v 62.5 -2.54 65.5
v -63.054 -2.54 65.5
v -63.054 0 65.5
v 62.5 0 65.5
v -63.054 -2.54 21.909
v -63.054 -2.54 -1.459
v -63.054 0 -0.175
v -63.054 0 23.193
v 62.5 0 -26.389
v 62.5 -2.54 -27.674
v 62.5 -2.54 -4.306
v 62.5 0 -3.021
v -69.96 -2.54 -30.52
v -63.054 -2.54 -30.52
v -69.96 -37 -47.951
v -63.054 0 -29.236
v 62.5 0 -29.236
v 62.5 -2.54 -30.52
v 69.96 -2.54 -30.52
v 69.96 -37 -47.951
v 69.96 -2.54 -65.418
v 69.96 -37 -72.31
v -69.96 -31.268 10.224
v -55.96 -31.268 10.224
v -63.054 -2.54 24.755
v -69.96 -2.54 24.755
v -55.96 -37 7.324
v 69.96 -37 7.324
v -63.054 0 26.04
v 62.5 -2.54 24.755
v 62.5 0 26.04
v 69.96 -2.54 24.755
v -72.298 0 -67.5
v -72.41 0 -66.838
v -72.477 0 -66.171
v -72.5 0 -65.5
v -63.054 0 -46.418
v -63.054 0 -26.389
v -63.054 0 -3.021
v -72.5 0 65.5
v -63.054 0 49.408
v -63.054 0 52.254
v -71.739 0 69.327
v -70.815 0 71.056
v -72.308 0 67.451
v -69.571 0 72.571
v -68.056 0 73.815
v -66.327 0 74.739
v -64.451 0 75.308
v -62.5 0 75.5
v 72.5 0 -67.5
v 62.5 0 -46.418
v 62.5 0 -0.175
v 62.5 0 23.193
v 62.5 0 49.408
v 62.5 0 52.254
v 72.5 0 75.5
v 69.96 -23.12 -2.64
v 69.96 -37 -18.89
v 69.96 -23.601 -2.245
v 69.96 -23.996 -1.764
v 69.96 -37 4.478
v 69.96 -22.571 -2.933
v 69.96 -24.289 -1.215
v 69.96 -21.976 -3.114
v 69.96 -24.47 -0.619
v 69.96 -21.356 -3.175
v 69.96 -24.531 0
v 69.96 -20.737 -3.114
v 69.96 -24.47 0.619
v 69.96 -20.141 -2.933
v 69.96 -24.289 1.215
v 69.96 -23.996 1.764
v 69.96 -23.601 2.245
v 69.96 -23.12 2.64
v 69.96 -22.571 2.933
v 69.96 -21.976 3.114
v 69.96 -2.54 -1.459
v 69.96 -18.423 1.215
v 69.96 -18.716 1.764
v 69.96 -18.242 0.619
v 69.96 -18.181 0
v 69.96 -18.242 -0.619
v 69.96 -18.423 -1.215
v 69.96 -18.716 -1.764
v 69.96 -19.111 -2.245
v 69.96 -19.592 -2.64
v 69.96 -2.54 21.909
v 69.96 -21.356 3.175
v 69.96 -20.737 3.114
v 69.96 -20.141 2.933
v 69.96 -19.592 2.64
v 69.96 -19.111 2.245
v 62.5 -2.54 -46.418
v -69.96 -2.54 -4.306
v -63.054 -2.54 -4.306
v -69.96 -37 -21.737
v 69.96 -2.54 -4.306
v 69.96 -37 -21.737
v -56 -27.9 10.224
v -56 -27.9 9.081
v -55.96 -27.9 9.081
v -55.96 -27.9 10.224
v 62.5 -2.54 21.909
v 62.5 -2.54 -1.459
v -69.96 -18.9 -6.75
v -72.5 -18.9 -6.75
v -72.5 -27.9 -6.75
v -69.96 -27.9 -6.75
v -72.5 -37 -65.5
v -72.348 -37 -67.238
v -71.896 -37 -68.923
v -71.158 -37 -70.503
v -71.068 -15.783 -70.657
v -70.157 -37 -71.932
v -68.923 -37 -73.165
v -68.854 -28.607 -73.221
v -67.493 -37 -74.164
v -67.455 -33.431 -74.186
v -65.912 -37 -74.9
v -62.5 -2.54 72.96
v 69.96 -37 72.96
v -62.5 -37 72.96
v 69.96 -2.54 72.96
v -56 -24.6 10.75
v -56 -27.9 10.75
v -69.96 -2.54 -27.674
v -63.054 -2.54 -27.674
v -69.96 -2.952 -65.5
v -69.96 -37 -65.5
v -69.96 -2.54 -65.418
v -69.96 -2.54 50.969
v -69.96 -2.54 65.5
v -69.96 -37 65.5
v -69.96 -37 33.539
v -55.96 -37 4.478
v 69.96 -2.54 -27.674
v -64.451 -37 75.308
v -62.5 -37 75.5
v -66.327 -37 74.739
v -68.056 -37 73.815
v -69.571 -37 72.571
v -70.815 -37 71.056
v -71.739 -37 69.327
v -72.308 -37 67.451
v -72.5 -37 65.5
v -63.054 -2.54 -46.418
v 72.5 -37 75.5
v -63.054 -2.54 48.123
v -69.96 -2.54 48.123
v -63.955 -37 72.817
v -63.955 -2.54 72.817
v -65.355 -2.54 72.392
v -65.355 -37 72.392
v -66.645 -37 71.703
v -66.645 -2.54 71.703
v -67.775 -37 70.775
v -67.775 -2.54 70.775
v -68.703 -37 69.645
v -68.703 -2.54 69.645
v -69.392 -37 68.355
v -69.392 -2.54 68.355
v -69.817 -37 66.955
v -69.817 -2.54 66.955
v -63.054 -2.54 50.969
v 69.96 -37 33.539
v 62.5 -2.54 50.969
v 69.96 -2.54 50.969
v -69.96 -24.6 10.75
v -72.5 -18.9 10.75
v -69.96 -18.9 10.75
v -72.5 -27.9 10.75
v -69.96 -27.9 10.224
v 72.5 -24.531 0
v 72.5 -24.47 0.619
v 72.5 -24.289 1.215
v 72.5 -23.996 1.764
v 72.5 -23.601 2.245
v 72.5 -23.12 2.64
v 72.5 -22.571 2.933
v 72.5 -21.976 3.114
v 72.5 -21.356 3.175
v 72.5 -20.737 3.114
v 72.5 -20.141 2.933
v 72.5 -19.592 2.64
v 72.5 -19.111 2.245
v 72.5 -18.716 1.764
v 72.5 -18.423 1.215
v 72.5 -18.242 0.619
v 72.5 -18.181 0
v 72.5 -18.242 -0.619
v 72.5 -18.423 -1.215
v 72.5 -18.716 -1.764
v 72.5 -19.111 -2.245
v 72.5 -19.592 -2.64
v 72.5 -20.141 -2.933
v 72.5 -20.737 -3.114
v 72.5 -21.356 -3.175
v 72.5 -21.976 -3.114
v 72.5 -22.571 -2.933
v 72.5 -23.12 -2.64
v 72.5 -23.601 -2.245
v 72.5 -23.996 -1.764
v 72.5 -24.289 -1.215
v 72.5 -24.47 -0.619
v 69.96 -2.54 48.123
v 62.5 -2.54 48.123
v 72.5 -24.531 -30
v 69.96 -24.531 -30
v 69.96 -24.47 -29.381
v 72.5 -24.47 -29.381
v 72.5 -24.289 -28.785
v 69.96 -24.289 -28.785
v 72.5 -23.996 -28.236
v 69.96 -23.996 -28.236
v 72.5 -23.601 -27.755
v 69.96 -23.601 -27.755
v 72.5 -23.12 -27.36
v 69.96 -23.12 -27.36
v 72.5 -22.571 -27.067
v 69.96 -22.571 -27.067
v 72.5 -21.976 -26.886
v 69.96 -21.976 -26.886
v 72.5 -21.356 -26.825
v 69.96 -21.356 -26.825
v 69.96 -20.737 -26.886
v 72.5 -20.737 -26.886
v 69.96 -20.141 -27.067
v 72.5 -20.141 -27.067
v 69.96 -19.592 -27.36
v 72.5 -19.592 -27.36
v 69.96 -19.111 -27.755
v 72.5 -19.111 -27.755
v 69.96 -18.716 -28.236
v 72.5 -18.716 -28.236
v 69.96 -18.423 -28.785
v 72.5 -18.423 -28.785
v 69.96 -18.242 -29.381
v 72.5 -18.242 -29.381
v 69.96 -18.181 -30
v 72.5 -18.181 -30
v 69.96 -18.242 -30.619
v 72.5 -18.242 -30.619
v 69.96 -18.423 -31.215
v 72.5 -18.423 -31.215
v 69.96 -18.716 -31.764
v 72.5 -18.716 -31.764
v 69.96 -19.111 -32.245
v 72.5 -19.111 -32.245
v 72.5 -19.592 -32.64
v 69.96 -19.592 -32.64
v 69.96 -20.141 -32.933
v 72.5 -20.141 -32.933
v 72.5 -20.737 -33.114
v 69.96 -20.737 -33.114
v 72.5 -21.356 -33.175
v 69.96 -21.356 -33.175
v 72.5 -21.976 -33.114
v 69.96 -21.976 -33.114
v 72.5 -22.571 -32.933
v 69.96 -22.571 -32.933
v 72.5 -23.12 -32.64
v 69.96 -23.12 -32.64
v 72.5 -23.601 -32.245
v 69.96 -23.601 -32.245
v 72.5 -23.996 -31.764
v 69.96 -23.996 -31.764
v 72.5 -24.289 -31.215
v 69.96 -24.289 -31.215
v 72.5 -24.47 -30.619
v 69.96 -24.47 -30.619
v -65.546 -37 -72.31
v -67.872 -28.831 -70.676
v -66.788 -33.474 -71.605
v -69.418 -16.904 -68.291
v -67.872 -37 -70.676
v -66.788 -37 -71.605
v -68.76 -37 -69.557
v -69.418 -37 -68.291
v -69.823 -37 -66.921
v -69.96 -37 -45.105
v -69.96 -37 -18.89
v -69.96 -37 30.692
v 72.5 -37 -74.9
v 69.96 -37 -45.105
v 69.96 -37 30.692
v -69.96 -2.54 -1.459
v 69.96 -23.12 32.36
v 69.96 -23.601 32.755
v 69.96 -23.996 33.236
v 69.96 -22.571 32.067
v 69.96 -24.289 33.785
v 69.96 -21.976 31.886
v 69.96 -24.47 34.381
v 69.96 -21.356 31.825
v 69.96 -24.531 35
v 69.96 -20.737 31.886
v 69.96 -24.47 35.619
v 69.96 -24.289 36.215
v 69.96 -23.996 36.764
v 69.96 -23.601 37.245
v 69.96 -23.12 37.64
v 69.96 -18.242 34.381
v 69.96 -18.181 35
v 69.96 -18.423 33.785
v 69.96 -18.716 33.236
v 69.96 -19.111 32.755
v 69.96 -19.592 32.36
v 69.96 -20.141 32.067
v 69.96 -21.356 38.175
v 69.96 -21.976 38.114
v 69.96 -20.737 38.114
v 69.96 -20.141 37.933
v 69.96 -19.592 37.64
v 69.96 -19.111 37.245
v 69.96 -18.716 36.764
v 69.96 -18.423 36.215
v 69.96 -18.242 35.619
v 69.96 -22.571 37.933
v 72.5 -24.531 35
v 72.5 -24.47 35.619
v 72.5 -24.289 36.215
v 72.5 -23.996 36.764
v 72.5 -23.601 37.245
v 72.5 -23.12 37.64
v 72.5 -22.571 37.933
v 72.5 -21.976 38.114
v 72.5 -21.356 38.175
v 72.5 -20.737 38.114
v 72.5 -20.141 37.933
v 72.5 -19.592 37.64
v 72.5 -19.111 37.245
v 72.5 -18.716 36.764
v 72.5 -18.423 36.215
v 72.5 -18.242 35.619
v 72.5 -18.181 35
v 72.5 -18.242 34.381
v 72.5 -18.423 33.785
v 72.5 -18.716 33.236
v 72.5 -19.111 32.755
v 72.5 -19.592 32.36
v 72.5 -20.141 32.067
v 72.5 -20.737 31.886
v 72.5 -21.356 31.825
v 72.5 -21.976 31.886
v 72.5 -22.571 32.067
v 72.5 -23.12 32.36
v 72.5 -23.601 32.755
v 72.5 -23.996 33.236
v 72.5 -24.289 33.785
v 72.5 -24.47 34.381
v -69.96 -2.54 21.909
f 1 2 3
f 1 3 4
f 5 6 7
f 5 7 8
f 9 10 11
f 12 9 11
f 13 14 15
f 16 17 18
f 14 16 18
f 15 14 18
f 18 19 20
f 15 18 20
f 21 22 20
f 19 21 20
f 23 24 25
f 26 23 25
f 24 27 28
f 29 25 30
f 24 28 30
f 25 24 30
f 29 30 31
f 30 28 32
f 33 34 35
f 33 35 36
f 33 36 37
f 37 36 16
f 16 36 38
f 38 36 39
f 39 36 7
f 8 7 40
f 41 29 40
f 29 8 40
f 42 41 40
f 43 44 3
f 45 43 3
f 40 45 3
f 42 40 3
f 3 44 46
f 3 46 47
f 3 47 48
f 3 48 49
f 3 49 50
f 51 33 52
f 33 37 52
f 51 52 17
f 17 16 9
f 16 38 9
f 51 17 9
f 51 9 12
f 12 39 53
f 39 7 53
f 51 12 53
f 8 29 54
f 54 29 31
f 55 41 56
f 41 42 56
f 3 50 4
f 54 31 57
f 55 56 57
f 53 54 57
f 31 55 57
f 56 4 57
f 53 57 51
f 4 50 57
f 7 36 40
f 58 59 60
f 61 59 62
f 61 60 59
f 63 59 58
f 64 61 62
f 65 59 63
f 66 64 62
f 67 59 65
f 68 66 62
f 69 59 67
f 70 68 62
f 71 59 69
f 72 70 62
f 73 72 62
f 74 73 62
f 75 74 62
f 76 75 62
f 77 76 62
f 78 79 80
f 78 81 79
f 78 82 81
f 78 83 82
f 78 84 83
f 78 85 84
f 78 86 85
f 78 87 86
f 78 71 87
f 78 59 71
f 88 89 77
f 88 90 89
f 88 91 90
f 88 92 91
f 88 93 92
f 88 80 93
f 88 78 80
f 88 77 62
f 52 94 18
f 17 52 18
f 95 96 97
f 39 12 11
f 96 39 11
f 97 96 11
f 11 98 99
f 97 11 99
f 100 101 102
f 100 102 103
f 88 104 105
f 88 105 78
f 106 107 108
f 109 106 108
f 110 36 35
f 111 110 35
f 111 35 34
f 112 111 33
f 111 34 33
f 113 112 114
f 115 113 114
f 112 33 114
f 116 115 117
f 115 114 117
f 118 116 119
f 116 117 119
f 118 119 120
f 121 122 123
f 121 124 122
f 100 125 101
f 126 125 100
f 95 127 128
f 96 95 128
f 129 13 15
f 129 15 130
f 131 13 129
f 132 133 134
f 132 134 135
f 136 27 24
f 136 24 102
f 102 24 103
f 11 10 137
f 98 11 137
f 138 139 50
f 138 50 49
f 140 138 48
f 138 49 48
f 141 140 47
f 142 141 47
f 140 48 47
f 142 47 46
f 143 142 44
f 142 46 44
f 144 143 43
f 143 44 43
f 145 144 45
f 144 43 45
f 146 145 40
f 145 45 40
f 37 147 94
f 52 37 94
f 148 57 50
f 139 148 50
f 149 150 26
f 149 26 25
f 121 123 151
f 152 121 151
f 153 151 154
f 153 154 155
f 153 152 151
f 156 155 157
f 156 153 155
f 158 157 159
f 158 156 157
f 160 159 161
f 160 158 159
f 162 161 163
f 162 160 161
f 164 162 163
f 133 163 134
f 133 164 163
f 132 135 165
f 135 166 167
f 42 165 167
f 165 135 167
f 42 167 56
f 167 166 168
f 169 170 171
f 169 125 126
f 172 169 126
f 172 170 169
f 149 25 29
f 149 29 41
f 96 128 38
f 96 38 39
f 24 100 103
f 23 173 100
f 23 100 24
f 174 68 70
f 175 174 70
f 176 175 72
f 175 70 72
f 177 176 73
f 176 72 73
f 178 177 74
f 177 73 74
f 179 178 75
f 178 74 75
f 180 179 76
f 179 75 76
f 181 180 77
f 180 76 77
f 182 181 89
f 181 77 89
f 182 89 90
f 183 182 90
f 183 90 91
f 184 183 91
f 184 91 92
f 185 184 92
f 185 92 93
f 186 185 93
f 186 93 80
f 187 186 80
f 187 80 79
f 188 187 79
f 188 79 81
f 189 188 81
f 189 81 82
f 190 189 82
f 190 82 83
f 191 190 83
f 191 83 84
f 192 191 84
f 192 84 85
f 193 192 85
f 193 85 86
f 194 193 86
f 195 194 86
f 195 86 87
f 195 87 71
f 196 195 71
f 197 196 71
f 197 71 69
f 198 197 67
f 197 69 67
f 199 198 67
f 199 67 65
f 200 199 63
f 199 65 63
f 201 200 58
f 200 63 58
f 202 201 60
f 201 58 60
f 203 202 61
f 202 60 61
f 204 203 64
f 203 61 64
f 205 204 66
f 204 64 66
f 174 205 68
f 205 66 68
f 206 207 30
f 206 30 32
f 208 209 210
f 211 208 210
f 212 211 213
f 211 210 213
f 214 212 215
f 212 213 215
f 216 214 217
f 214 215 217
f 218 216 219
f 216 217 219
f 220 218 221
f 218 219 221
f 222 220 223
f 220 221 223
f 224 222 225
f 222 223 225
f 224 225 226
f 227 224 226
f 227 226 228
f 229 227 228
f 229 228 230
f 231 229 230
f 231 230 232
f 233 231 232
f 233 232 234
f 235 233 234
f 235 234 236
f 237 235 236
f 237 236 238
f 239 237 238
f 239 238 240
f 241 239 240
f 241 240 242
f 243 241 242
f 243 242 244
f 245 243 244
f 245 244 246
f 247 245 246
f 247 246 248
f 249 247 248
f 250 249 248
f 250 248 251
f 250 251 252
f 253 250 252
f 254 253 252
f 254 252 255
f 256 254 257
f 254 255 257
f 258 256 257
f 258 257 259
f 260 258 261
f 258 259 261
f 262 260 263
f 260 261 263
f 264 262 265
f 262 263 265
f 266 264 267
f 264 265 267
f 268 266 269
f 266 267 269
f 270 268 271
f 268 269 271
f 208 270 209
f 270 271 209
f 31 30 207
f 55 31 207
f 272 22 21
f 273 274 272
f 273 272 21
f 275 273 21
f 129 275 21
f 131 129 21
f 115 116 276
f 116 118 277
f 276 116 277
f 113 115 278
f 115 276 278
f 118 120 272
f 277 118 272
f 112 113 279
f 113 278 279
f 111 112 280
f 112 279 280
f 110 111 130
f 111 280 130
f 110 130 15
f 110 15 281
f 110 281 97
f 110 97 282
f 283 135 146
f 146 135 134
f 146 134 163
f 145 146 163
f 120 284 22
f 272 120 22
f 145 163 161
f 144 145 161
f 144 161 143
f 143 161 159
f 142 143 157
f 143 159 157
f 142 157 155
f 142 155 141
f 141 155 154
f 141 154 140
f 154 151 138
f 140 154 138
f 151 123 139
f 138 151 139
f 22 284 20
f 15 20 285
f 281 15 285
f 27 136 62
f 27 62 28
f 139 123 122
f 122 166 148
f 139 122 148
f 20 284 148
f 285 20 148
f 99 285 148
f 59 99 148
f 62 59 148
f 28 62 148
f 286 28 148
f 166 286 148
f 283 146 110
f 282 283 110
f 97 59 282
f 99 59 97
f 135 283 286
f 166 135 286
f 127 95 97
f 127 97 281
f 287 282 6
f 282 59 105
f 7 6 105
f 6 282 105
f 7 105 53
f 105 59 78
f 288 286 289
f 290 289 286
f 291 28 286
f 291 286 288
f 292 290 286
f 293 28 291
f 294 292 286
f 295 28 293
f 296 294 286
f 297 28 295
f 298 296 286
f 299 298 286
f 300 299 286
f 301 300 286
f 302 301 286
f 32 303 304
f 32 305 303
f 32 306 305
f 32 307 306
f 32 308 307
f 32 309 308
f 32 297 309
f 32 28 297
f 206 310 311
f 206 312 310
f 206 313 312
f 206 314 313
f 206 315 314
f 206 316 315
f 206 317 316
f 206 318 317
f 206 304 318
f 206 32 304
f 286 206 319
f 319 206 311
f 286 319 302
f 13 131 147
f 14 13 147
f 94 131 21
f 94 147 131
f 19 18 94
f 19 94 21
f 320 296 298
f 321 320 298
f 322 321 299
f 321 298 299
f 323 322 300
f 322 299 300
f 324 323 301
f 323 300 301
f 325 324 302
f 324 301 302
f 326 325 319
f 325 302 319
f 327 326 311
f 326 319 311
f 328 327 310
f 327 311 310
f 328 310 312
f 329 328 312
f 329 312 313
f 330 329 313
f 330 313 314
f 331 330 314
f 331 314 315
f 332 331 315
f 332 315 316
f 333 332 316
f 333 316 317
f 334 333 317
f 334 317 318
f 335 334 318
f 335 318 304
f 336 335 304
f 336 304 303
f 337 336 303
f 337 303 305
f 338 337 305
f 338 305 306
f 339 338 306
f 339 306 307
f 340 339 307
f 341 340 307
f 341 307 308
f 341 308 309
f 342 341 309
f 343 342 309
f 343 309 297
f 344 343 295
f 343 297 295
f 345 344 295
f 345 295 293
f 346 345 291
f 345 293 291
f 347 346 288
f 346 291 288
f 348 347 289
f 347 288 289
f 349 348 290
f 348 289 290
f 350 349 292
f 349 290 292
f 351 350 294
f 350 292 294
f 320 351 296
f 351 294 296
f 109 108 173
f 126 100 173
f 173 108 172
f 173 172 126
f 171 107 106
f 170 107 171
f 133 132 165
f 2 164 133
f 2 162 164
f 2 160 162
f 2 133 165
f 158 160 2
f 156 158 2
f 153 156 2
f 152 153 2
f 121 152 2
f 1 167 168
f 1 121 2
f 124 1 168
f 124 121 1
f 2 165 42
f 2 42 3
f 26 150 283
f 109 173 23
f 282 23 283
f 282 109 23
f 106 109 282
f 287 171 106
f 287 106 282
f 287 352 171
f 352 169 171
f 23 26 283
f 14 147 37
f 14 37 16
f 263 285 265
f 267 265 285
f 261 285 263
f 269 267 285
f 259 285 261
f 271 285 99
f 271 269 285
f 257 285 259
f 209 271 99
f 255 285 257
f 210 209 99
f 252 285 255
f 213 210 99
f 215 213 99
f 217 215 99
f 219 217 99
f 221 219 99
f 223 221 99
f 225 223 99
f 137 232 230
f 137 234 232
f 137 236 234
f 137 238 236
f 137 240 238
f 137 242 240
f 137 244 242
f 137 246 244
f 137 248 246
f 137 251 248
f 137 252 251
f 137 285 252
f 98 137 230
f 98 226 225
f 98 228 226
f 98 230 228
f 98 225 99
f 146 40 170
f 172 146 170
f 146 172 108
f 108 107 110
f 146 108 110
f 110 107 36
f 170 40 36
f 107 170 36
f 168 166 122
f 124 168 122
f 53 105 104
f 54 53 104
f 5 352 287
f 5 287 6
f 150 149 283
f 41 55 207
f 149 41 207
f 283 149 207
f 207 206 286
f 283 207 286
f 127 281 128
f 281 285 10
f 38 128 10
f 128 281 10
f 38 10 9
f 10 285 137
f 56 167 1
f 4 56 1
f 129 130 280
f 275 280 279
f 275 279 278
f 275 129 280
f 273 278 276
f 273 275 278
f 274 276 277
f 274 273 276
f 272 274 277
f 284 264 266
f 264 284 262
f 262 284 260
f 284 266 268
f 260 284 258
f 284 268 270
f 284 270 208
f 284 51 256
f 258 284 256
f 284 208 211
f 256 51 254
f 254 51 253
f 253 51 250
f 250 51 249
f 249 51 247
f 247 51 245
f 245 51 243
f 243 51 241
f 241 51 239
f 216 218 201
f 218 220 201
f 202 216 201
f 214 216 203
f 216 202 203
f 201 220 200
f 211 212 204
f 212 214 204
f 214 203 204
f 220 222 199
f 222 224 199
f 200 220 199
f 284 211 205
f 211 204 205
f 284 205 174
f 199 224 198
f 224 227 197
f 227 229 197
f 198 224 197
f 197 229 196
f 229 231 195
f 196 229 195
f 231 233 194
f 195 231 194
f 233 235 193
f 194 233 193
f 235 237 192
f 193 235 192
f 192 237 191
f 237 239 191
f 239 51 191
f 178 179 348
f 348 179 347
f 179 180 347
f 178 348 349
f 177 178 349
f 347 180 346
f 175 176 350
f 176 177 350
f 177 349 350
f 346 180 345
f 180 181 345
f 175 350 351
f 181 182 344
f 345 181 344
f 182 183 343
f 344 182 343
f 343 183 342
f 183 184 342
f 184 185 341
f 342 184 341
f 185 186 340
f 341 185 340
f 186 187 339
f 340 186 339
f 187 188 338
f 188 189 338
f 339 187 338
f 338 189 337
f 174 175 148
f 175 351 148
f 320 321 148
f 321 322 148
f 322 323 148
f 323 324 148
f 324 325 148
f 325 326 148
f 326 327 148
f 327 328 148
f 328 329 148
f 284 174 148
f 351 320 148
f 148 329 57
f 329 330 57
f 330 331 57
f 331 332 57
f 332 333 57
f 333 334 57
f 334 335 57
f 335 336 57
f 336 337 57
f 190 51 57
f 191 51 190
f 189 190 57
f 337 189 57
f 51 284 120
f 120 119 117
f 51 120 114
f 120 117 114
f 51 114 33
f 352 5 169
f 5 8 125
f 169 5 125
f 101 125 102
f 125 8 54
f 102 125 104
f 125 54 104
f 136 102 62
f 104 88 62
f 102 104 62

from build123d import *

# Parameters (mm, degrees)
F1_DEPTH    = 37
F2_T1_DEPTH = 342.8505669038
F3_T        = -2.54
F4_W        = 125.55387271
F4_H        = 111.9176980871
F5_DEPTH    = 25.4
F6_R        = 3.175
F7_DEPTH    = 19.05
F9_DEPTH    = 142.24
F10_W       = 9
F10_H       = 17.5
F11_DEPTH   = 16.5
F13_DEPTH   = 14


# Not quite as in the source:
# - a fillet or chamfer that OpenCascade refuses, or shapes differently, is made with other operations: its cross-section is extruded or revolved along the edge and cut away or added
# - a feature names something its author has since deleted; it is built from what else it names


with BuildPart() as f1:
    # F0 (on Front) → F1 (new body)
    with BuildSketch(Plane.XZ):
        with BuildLine():
            Line((72.5, 75.5), (-62.5, 75.5))
            ThreePointArc((-62.5, 75.5), (-69.5710678119, 72.5710678119), (-72.5, 65.5))
            Line((-72.5, 65.5), (-72.5, -65.5))
            ThreePointArc((-72.5, -65.5), (-69.5710678119, -72.5710678119), (-62.5, -75.5))
            Line((-62.5, -75.5), (72.5, -75.5))
            Line((72.5, -75.5), (72.5, 75.5))
        make_face()
    extrude(amount=F1_DEPTH)

    # F2: chamfer of 40 x 8 on 1 edges, made by hand

    # F2_s2 → F2_t1 (cut)
    with BuildSketch(Plane.YZ.offset(-166.4252834519)):
        Polygon((-40, -75.5), (0, -67.5), (0, -75.5), align=None)
    extrude(amount=F2_T1_DEPTH, mode=Mode.SUBTRACT)

    # F3
    f3_openings = [f1.faces().sort_by_distance(p)[0] for p in [
        (0.123954, -37, 0.284541),
    ]]
    offset(amount=F3_T, openings=f3_openings)

    # F4 (on face) → F5 (cut)
    with BuildSketch(Plane.XZ.offset(2.54)):
        with Locations((-0.276936355, 9.5411509565)):
            Rectangle(F4_W, F4_H)
    extrude(amount=-F5_DEPTH, mode=Mode.SUBTRACT)

    # F6 (on face) → F7 (cut)
    with BuildSketch(Plane(origin=(69.96, 0, 0), x_dir=(0, -1, 0), z_dir=(-1, 0, 0))):
        with Locations((21.3561020792, 0)):
            Circle(F6_R)
        with Locations((21.3561020792, 35)):
            Circle(F6_R)
        with Locations((21.3561020792, -30)):
            Circle(F6_R)
    extrude(amount=-F7_DEPTH, mode=Mode.SUBTRACT)

    # F8 (on face) → F9 (join)
    with BuildSketch(Plane(origin=(69.96, 0, 0), x_dir=(0, -1, 0), z_dir=(-1, 0, 0))):
        Polygon((0, -29.2355429628), (37, -47.9510980871), (37, -45.1046433113), (0, -26.389088187), align=None)
        Polygon((0, -3.021088187), (37, -21.7366433113), (37, -18.8901885355), (0, -0.1746334112), align=None)
        Polygon((0, 23.1933665888), (37, 4.4778114645), (37, 7.3242662403), (0, 26.0398213646), align=None)
        Polygon((0, 49.4078213646), (37, 30.6922662403), (37, 33.5387210161), (0, 52.2542761405), align=None)
    extrude(amount=F9_DEPTH)

    # F10 (on face) → F11 (cut)
    with BuildSketch(Plane(origin=(-72.5, 0, 0), x_dir=(0, -1, 0), z_dir=(-1, 0, 0))):
        with Locations((23.4, 2)):
            Rectangle(F10_W, F10_H)
    extrude(amount=-F11_DEPTH, mode=Mode.SUBTRACT)

    # F12 (on face) → F13 (cut)
    with BuildSketch(Plane.YZ.offset(-69.96)):
        Polygon((-44.6556091905, -6.75), (-37, -6.75), (-37, 4.4778114645), (-27.9, 9.0808263735), (-27.9, 10.2238561958), (-44.6556091905, 10.2238561958), align=None)
    extrude(amount=F13_DEPTH, mode=Mode.SUBTRACT)


solid = f1.part
